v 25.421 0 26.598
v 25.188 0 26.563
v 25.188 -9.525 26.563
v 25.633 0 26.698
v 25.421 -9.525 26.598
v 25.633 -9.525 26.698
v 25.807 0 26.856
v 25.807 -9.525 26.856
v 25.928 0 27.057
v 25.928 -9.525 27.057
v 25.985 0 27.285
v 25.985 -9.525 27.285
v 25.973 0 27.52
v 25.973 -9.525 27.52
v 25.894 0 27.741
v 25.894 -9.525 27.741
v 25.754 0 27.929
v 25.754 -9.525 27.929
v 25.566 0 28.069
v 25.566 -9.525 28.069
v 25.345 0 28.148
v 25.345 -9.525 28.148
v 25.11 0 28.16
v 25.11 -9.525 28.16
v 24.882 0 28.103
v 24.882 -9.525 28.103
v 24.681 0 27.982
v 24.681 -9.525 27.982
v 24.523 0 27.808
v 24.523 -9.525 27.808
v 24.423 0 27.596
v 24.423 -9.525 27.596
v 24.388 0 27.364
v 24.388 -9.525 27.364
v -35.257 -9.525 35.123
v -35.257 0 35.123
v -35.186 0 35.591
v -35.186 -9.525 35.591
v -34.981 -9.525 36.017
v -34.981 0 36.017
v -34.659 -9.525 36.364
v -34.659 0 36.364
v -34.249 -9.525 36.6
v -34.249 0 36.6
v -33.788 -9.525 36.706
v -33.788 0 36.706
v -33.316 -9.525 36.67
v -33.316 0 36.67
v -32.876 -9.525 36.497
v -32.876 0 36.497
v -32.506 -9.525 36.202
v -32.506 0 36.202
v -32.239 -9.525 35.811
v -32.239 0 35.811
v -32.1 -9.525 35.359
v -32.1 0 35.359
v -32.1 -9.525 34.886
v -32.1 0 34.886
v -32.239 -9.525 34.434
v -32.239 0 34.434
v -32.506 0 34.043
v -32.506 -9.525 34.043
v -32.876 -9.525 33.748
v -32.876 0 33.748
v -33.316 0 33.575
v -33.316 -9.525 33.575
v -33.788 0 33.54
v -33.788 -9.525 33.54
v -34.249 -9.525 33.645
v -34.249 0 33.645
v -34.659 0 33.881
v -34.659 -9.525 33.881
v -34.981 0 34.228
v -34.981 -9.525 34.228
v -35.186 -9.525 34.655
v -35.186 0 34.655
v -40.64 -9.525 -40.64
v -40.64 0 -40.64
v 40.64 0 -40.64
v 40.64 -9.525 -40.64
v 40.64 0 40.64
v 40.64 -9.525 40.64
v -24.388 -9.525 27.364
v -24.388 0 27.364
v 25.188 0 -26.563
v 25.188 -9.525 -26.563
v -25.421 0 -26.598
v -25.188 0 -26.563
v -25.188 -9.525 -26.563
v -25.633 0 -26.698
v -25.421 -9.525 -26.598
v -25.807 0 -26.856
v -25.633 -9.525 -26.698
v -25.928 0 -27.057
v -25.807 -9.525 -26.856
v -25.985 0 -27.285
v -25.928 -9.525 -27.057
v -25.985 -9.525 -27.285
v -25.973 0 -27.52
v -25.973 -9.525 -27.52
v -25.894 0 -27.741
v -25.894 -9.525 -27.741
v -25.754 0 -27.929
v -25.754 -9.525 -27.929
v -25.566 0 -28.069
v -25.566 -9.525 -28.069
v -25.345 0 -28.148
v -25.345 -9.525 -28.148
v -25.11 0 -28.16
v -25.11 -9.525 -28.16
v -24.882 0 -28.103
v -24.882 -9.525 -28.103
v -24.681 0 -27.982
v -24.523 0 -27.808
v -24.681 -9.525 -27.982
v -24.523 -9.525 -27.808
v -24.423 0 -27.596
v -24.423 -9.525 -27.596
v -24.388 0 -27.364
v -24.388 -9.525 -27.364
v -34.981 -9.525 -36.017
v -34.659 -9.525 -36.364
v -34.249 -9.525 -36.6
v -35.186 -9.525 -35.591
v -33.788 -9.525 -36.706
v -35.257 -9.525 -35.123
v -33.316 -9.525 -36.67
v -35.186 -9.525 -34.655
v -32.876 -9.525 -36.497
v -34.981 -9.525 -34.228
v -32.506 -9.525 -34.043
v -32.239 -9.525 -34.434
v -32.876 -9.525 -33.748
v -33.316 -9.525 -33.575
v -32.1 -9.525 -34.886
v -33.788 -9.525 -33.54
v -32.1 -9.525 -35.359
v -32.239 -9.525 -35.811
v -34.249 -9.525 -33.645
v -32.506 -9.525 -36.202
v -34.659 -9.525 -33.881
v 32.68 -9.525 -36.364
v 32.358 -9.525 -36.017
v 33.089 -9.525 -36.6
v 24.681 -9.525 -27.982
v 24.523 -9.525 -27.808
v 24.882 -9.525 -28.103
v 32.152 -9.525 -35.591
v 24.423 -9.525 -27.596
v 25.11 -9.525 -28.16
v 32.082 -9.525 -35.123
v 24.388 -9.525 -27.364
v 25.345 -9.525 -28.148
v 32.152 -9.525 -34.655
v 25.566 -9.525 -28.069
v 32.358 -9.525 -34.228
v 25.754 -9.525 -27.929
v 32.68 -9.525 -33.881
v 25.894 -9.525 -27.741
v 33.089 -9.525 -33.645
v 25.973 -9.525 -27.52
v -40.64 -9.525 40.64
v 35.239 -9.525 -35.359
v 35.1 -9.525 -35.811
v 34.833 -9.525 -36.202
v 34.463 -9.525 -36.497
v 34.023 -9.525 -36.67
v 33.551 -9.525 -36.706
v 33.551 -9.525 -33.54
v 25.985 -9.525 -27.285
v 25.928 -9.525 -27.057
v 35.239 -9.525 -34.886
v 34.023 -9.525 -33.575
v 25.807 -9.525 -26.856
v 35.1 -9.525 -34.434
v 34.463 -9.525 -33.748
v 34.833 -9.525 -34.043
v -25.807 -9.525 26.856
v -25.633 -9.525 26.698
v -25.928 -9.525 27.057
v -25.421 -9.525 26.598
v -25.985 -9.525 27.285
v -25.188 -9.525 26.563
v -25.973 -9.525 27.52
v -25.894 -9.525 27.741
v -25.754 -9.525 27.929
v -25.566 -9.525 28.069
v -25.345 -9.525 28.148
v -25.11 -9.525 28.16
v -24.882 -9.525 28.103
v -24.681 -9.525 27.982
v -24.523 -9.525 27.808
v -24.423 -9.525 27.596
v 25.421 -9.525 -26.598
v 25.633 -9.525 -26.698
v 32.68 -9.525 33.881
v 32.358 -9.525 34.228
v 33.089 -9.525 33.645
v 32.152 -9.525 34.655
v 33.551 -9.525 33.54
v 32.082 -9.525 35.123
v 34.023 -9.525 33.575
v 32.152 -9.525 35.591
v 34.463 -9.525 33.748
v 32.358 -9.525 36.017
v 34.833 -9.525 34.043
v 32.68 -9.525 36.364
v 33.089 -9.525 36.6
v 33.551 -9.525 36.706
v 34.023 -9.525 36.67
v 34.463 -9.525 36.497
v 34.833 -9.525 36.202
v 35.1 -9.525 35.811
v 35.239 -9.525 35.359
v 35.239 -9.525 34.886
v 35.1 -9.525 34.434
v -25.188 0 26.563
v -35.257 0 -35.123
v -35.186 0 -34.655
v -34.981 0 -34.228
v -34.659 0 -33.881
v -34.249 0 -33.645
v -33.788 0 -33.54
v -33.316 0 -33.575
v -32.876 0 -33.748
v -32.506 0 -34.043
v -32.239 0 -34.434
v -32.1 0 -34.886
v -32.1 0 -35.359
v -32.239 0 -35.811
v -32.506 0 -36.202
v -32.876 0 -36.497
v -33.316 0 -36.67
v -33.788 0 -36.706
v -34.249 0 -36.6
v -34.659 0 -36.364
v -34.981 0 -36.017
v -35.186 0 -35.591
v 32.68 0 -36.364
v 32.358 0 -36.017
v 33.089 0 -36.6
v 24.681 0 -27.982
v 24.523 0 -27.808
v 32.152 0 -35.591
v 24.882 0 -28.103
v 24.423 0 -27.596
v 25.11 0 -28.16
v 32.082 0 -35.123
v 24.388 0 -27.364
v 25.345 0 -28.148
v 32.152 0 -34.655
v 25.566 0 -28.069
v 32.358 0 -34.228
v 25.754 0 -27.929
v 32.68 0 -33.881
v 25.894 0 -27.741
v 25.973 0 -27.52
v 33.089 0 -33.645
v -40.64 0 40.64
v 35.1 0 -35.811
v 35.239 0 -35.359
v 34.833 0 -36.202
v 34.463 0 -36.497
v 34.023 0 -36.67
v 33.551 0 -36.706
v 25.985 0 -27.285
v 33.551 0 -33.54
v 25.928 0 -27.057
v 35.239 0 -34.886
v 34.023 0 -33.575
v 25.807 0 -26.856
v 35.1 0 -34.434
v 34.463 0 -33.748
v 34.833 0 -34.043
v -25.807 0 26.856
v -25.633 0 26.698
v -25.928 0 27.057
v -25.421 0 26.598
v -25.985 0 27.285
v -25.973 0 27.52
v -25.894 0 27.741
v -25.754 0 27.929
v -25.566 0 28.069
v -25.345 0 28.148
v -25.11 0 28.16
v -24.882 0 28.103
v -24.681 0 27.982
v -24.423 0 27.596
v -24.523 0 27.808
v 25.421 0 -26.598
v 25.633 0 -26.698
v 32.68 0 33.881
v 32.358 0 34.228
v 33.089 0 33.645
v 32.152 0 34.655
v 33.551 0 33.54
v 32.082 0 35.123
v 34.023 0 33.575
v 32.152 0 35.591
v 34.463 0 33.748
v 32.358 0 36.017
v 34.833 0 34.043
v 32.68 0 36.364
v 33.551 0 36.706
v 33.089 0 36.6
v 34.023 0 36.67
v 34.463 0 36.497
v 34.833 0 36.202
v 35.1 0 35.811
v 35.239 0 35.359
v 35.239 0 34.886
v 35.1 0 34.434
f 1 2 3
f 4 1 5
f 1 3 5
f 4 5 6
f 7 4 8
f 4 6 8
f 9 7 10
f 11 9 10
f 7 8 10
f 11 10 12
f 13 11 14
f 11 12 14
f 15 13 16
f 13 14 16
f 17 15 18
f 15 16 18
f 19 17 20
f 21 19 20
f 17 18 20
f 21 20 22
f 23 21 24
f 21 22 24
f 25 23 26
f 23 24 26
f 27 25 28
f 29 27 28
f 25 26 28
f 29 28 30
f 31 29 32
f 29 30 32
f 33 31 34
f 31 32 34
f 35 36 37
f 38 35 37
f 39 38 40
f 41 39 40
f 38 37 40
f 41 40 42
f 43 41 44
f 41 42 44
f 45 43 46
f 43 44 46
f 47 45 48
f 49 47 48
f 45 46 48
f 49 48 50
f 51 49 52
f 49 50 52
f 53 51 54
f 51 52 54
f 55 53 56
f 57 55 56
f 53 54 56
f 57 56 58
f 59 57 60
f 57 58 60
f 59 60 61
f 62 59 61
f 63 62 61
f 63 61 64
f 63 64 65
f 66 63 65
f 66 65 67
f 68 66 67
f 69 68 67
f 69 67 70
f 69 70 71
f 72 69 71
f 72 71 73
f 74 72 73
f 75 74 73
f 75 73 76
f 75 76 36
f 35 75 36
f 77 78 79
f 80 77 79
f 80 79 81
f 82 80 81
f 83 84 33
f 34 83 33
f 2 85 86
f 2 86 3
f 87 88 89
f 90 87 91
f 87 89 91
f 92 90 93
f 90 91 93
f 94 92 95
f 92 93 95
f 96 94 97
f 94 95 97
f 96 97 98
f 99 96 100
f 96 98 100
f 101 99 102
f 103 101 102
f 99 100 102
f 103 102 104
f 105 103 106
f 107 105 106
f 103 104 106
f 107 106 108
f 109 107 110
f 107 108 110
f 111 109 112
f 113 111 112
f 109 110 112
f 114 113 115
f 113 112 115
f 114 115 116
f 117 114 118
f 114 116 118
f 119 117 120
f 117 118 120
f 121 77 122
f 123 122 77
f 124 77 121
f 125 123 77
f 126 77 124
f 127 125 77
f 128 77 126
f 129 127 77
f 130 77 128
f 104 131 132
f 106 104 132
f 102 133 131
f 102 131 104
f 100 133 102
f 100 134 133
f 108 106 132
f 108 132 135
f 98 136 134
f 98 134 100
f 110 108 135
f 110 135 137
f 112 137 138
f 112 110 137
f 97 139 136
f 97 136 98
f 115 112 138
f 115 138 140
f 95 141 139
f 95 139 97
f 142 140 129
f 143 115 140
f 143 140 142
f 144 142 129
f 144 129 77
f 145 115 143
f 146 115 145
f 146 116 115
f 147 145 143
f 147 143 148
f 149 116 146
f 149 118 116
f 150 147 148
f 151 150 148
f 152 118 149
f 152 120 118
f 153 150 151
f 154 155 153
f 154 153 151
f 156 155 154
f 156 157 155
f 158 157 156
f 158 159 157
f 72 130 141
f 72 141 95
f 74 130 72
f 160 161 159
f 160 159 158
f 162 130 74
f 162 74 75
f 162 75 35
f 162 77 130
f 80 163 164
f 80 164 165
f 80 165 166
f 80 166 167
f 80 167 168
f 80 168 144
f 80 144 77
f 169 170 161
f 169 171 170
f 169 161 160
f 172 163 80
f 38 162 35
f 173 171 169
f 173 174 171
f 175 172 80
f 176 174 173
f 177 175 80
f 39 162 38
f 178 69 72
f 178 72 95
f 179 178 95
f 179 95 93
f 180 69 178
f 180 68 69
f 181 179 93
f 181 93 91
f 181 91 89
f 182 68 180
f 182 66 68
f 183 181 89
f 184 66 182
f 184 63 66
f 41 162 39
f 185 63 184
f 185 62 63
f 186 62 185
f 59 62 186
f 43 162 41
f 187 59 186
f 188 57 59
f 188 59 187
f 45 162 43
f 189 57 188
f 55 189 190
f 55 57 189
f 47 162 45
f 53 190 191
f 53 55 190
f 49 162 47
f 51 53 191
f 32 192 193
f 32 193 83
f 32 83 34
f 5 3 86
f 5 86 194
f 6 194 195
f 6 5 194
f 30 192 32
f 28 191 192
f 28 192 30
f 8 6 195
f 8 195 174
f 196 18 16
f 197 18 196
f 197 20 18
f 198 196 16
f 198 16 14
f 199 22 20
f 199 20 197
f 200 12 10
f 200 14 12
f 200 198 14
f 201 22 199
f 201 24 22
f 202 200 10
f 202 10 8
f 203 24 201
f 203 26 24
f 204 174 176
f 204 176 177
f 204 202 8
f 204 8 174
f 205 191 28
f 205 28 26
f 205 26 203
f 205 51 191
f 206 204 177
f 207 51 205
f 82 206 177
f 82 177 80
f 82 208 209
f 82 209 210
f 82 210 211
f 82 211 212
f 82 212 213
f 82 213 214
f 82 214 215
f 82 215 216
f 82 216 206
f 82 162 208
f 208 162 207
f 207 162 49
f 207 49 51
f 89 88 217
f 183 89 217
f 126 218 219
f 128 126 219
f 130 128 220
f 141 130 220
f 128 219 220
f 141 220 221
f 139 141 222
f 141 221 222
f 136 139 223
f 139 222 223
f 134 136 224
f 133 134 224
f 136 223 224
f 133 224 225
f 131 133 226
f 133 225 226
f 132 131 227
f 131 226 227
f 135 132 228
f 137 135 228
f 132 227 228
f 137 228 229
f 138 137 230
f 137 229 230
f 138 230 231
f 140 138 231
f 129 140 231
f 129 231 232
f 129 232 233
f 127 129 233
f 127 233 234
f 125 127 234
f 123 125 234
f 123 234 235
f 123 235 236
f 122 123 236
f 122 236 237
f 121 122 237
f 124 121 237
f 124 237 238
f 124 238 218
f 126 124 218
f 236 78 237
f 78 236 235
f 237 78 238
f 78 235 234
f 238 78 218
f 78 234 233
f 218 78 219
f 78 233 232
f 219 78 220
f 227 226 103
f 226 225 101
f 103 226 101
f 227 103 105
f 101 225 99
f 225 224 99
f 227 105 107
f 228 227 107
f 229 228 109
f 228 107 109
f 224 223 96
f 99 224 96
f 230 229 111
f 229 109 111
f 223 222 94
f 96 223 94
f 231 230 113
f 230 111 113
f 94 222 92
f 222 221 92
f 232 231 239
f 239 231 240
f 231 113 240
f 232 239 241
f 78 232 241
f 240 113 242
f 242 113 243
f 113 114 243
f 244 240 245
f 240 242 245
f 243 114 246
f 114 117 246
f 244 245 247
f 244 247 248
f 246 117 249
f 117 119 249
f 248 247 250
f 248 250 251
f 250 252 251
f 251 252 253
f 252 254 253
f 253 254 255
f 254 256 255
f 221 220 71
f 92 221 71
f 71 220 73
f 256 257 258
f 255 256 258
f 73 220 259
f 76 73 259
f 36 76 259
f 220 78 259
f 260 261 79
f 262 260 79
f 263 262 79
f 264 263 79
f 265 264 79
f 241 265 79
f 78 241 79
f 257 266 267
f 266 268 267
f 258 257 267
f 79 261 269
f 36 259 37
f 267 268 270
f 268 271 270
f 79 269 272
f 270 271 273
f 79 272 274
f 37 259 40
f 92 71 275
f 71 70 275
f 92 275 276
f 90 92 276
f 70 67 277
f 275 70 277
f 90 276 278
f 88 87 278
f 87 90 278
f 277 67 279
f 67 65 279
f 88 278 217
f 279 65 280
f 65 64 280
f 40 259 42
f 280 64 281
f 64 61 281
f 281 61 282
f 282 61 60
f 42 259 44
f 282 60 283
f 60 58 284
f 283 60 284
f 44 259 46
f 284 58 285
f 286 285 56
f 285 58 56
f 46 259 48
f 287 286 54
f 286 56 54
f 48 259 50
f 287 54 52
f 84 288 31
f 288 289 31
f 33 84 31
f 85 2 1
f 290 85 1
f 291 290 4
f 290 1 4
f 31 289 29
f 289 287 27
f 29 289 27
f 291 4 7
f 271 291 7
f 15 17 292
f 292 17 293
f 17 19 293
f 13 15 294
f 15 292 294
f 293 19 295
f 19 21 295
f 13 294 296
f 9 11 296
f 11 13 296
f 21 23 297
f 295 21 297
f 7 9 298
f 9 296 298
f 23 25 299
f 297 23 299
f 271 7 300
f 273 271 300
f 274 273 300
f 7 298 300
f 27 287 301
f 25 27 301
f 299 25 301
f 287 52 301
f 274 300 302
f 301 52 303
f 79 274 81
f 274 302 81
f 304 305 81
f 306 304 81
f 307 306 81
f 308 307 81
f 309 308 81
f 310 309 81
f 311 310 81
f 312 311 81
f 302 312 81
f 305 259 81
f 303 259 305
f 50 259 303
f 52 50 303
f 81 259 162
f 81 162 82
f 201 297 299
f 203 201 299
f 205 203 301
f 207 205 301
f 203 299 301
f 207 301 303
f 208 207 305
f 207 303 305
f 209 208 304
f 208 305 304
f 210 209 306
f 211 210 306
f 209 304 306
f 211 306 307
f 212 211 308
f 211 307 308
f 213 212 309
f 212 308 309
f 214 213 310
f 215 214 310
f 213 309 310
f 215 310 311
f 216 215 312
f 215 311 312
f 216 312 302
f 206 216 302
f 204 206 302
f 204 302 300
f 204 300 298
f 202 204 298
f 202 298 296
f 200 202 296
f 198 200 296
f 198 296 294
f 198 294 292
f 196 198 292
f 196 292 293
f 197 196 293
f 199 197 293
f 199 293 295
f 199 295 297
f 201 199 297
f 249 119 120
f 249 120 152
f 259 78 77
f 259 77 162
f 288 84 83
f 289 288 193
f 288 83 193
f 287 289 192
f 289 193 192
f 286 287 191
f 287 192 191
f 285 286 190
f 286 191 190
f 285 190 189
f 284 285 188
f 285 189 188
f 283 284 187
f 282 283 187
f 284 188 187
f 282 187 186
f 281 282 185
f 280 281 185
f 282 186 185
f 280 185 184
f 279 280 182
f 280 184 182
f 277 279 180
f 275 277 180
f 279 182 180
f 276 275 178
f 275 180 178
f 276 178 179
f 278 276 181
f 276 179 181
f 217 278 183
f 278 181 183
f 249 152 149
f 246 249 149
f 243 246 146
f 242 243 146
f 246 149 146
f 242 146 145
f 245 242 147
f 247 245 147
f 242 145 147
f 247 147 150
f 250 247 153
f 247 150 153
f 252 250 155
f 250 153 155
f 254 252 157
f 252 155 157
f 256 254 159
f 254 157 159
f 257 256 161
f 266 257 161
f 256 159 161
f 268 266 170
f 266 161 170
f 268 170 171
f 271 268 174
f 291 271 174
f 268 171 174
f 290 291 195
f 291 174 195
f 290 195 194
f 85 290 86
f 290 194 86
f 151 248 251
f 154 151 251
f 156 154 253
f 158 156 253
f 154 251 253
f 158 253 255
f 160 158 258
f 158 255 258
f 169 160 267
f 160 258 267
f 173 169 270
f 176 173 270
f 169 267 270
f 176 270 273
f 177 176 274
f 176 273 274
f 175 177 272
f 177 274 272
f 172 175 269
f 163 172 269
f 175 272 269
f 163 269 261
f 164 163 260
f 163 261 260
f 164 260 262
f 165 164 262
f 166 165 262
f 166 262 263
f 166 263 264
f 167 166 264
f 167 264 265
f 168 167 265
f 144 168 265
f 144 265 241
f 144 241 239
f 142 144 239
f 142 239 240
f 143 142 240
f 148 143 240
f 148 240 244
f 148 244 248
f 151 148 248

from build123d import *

# Parameters (mm, degrees)
F0_W     = 81.28
F0_H     = 81.28
F0_W_2   = 50.377
F0_H_2   = 54.727
F1_DEPTH = 9.525
F3_D     = 3.175
F4_D     = 1.6002


# Not quite as in the source:
# - a feature names something its author has since deleted; it is built from what else it names


with BuildPart() as f1:
    # F0 (on Front) → F1 (new body)
    with BuildSketch(Plane.XZ):
        Rectangle(F0_W, F0_H)
        Rectangle(F0_W_2, F0_H_2, mode=Mode.SUBTRACT)
    extrude(amount=F1_DEPTH)

    # F3 (through all)
    with Locations(Plane.XZ.offset(9.525)):
        with Locations((-33.6692971992, 35.1226272138), (33.6692971992, 35.1226272138), (-33.6692971992, -35.1226272138), (33.6692971992, -35.1226272138)):
            Hole(F3_D / 2)

    # F4 (through all)
    with Locations(Plane(origin=(0, 0, 0), x_dir=(1, 0, 0), z_dir=(0, 1, 0))):
        with Locations((25.1885, -27.3635), (-25.1885, -27.3635), (-25.1885, 27.3635), (25.1885, 27.3635)):
            Hole(F4_D / 2)


solid = f1.part
